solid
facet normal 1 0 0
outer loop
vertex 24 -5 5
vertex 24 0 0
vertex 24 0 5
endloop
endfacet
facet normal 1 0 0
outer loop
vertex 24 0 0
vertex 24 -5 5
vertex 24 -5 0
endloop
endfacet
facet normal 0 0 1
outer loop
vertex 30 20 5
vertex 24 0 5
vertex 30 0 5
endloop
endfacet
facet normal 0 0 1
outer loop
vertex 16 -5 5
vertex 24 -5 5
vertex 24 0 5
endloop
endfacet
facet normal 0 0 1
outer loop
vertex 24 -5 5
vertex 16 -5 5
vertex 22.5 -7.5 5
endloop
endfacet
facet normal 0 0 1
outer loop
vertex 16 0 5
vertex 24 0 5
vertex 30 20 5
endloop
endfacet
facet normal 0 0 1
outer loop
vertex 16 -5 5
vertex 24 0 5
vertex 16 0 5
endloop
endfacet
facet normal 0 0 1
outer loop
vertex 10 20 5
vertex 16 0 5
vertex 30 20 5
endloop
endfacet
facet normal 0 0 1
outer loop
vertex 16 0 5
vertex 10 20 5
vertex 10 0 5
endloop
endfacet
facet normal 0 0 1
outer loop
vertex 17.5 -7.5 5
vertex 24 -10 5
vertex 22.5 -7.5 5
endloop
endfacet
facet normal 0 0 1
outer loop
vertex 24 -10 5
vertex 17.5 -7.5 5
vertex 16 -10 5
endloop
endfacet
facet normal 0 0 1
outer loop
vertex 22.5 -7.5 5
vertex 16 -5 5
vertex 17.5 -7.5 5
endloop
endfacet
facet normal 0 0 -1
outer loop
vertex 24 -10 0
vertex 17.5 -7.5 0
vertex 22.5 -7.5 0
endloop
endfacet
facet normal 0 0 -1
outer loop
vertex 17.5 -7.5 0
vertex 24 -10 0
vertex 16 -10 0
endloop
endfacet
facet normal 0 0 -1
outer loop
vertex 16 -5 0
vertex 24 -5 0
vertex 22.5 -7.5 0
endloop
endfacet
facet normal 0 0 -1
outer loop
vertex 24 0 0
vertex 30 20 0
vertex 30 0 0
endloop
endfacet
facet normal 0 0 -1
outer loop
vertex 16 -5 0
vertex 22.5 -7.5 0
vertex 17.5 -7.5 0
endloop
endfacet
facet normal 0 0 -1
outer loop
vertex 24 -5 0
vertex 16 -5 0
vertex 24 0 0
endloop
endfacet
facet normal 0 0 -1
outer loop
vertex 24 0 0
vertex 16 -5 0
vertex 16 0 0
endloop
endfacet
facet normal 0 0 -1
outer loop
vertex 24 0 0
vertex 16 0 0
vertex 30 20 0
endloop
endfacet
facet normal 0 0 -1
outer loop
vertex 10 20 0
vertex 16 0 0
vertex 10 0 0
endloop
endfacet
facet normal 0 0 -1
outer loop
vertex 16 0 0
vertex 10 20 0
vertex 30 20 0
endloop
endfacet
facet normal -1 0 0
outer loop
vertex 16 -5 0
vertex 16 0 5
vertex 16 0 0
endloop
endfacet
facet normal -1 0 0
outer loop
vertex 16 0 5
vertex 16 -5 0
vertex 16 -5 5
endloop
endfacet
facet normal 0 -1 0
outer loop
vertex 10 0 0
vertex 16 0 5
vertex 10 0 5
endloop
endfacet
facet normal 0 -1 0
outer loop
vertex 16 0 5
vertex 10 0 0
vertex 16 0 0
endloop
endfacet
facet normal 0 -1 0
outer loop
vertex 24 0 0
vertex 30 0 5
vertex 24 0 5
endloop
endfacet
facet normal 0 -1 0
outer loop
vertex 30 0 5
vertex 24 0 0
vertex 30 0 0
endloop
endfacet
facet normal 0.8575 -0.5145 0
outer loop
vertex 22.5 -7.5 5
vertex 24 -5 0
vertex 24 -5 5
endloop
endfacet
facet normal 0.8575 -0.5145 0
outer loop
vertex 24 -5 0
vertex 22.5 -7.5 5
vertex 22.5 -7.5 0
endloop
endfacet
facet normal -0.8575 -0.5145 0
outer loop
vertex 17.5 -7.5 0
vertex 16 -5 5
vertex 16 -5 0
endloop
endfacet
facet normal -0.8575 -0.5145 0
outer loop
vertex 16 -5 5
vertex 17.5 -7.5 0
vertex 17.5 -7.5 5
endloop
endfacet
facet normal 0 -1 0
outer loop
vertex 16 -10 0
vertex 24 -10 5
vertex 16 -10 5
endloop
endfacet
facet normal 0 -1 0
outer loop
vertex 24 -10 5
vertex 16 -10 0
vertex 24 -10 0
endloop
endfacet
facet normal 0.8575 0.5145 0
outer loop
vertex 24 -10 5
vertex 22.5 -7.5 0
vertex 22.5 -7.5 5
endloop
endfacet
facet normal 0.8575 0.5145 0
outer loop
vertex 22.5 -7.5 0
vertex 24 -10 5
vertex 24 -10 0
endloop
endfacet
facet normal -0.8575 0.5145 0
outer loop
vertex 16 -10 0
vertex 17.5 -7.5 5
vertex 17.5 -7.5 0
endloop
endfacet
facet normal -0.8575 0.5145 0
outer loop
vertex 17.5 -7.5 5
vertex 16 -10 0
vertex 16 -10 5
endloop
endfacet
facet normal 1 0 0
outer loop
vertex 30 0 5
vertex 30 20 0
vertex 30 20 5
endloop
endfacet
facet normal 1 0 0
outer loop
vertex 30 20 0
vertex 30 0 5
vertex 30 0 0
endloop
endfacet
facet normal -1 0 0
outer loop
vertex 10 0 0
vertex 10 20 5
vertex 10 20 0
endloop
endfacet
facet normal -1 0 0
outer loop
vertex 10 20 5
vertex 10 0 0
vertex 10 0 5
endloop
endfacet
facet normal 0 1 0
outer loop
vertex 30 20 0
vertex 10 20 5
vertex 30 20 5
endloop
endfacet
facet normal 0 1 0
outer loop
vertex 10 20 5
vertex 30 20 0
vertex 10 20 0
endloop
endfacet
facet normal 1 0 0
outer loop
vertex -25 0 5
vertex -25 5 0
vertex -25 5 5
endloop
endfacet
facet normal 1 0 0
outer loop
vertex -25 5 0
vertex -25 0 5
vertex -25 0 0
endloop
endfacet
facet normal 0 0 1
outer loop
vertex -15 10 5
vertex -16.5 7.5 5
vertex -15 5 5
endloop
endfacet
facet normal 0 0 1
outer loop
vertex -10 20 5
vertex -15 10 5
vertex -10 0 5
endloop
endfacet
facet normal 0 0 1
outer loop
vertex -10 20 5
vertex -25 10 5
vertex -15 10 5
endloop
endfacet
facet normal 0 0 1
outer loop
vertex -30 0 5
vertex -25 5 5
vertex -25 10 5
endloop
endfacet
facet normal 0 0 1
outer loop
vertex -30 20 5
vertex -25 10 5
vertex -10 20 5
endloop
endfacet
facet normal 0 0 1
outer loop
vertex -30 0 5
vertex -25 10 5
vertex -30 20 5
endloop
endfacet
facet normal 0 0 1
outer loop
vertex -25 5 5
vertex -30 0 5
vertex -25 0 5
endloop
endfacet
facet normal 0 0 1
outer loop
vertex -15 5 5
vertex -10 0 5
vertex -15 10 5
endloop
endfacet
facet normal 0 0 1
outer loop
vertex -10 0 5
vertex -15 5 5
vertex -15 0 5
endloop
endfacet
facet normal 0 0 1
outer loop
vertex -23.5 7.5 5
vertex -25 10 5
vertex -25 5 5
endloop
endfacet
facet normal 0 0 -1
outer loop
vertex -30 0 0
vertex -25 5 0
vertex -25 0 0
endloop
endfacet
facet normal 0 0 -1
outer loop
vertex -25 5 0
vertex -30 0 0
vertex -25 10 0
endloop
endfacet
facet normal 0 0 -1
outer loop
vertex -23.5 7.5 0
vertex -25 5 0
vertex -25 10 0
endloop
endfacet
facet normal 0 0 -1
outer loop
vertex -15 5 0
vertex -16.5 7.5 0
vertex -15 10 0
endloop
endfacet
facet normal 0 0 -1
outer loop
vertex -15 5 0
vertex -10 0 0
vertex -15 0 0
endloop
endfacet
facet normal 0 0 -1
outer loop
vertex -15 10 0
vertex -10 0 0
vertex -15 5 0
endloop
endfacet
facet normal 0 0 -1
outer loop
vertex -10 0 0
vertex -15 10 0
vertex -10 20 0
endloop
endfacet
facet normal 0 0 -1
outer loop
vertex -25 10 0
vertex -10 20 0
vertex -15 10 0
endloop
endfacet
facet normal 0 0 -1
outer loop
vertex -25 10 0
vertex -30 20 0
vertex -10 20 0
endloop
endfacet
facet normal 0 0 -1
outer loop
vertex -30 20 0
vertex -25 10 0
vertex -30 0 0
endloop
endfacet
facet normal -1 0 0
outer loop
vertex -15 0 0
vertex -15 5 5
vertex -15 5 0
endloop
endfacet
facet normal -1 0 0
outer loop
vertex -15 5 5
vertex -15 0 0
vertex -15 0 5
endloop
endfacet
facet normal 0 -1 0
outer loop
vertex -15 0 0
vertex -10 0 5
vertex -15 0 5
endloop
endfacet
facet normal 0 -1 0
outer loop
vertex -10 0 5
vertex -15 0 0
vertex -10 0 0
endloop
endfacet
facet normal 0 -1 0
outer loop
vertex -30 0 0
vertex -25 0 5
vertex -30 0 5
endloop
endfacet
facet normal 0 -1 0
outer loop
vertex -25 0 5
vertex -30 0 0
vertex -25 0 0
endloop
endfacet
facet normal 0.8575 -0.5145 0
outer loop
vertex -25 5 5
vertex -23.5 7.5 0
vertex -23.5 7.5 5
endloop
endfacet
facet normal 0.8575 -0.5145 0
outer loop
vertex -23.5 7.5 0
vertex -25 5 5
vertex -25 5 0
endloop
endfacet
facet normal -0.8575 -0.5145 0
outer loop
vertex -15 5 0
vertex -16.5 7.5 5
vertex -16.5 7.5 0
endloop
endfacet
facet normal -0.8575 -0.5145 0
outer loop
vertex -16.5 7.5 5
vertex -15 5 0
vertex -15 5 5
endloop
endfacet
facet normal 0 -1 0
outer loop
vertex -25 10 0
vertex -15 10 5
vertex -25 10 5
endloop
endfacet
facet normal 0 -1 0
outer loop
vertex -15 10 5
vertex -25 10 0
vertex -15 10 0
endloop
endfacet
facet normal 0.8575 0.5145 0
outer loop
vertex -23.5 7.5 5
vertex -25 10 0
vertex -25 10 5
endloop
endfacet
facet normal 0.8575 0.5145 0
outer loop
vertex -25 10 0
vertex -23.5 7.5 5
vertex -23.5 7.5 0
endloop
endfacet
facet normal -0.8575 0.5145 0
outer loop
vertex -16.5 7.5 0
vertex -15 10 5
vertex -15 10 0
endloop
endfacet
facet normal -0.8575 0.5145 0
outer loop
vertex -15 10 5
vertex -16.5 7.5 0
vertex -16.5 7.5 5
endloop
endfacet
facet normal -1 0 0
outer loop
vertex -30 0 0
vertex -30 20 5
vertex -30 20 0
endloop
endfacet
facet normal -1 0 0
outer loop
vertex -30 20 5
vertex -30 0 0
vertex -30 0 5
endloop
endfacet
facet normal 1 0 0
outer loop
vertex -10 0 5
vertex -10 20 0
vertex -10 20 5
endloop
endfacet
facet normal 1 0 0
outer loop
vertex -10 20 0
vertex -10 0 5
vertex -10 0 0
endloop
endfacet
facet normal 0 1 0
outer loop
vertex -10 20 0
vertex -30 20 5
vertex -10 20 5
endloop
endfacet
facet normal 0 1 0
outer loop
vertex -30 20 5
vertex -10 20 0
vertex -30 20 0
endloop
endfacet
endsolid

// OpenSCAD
//Interlocking pieces
//copyright SJ Hindmarch 2015
// ToDo: How to make the male piece smaller in the right dimensions to fit the female piece.
// This solution works OK for the cube but not for the double trapezoid.
// Probably need to use trig to caluculate the points of the trapezium in order to preserve
// angles, or to upgrade my copy of OpenSCAD to gain the polygon offset function.

module trapezoid(tol){
	linear_extrude(height=5){
		polygon(
			points=[[0-tol,0],[3-tol,5],[7+tol,5],[10+tol,0]],
			paths=[[0,1,2,3]]
		);
	}
}

module base(){
	cube([20,20,5]);
}

module lock(tol){
	cube([10+(tol*2),5,5]);
	translate([tol,5,0,]){trapezoid(tol);}
	translate([tol,10,0,])mirror([0,1,0]){trapezoid(tol);}
}

module male(tol){
	translate([10,0,0])base();
	mirror([0,1,0])translate([15-tol,0,0])lock(tol);
}

module female(tol){
	mirror([1,0,0])
	difference(){
		translate([10,0,0])base();
		translate([15,0,0])lock(tol);
	}
}

male(-1);
female(0);

//!lock();
